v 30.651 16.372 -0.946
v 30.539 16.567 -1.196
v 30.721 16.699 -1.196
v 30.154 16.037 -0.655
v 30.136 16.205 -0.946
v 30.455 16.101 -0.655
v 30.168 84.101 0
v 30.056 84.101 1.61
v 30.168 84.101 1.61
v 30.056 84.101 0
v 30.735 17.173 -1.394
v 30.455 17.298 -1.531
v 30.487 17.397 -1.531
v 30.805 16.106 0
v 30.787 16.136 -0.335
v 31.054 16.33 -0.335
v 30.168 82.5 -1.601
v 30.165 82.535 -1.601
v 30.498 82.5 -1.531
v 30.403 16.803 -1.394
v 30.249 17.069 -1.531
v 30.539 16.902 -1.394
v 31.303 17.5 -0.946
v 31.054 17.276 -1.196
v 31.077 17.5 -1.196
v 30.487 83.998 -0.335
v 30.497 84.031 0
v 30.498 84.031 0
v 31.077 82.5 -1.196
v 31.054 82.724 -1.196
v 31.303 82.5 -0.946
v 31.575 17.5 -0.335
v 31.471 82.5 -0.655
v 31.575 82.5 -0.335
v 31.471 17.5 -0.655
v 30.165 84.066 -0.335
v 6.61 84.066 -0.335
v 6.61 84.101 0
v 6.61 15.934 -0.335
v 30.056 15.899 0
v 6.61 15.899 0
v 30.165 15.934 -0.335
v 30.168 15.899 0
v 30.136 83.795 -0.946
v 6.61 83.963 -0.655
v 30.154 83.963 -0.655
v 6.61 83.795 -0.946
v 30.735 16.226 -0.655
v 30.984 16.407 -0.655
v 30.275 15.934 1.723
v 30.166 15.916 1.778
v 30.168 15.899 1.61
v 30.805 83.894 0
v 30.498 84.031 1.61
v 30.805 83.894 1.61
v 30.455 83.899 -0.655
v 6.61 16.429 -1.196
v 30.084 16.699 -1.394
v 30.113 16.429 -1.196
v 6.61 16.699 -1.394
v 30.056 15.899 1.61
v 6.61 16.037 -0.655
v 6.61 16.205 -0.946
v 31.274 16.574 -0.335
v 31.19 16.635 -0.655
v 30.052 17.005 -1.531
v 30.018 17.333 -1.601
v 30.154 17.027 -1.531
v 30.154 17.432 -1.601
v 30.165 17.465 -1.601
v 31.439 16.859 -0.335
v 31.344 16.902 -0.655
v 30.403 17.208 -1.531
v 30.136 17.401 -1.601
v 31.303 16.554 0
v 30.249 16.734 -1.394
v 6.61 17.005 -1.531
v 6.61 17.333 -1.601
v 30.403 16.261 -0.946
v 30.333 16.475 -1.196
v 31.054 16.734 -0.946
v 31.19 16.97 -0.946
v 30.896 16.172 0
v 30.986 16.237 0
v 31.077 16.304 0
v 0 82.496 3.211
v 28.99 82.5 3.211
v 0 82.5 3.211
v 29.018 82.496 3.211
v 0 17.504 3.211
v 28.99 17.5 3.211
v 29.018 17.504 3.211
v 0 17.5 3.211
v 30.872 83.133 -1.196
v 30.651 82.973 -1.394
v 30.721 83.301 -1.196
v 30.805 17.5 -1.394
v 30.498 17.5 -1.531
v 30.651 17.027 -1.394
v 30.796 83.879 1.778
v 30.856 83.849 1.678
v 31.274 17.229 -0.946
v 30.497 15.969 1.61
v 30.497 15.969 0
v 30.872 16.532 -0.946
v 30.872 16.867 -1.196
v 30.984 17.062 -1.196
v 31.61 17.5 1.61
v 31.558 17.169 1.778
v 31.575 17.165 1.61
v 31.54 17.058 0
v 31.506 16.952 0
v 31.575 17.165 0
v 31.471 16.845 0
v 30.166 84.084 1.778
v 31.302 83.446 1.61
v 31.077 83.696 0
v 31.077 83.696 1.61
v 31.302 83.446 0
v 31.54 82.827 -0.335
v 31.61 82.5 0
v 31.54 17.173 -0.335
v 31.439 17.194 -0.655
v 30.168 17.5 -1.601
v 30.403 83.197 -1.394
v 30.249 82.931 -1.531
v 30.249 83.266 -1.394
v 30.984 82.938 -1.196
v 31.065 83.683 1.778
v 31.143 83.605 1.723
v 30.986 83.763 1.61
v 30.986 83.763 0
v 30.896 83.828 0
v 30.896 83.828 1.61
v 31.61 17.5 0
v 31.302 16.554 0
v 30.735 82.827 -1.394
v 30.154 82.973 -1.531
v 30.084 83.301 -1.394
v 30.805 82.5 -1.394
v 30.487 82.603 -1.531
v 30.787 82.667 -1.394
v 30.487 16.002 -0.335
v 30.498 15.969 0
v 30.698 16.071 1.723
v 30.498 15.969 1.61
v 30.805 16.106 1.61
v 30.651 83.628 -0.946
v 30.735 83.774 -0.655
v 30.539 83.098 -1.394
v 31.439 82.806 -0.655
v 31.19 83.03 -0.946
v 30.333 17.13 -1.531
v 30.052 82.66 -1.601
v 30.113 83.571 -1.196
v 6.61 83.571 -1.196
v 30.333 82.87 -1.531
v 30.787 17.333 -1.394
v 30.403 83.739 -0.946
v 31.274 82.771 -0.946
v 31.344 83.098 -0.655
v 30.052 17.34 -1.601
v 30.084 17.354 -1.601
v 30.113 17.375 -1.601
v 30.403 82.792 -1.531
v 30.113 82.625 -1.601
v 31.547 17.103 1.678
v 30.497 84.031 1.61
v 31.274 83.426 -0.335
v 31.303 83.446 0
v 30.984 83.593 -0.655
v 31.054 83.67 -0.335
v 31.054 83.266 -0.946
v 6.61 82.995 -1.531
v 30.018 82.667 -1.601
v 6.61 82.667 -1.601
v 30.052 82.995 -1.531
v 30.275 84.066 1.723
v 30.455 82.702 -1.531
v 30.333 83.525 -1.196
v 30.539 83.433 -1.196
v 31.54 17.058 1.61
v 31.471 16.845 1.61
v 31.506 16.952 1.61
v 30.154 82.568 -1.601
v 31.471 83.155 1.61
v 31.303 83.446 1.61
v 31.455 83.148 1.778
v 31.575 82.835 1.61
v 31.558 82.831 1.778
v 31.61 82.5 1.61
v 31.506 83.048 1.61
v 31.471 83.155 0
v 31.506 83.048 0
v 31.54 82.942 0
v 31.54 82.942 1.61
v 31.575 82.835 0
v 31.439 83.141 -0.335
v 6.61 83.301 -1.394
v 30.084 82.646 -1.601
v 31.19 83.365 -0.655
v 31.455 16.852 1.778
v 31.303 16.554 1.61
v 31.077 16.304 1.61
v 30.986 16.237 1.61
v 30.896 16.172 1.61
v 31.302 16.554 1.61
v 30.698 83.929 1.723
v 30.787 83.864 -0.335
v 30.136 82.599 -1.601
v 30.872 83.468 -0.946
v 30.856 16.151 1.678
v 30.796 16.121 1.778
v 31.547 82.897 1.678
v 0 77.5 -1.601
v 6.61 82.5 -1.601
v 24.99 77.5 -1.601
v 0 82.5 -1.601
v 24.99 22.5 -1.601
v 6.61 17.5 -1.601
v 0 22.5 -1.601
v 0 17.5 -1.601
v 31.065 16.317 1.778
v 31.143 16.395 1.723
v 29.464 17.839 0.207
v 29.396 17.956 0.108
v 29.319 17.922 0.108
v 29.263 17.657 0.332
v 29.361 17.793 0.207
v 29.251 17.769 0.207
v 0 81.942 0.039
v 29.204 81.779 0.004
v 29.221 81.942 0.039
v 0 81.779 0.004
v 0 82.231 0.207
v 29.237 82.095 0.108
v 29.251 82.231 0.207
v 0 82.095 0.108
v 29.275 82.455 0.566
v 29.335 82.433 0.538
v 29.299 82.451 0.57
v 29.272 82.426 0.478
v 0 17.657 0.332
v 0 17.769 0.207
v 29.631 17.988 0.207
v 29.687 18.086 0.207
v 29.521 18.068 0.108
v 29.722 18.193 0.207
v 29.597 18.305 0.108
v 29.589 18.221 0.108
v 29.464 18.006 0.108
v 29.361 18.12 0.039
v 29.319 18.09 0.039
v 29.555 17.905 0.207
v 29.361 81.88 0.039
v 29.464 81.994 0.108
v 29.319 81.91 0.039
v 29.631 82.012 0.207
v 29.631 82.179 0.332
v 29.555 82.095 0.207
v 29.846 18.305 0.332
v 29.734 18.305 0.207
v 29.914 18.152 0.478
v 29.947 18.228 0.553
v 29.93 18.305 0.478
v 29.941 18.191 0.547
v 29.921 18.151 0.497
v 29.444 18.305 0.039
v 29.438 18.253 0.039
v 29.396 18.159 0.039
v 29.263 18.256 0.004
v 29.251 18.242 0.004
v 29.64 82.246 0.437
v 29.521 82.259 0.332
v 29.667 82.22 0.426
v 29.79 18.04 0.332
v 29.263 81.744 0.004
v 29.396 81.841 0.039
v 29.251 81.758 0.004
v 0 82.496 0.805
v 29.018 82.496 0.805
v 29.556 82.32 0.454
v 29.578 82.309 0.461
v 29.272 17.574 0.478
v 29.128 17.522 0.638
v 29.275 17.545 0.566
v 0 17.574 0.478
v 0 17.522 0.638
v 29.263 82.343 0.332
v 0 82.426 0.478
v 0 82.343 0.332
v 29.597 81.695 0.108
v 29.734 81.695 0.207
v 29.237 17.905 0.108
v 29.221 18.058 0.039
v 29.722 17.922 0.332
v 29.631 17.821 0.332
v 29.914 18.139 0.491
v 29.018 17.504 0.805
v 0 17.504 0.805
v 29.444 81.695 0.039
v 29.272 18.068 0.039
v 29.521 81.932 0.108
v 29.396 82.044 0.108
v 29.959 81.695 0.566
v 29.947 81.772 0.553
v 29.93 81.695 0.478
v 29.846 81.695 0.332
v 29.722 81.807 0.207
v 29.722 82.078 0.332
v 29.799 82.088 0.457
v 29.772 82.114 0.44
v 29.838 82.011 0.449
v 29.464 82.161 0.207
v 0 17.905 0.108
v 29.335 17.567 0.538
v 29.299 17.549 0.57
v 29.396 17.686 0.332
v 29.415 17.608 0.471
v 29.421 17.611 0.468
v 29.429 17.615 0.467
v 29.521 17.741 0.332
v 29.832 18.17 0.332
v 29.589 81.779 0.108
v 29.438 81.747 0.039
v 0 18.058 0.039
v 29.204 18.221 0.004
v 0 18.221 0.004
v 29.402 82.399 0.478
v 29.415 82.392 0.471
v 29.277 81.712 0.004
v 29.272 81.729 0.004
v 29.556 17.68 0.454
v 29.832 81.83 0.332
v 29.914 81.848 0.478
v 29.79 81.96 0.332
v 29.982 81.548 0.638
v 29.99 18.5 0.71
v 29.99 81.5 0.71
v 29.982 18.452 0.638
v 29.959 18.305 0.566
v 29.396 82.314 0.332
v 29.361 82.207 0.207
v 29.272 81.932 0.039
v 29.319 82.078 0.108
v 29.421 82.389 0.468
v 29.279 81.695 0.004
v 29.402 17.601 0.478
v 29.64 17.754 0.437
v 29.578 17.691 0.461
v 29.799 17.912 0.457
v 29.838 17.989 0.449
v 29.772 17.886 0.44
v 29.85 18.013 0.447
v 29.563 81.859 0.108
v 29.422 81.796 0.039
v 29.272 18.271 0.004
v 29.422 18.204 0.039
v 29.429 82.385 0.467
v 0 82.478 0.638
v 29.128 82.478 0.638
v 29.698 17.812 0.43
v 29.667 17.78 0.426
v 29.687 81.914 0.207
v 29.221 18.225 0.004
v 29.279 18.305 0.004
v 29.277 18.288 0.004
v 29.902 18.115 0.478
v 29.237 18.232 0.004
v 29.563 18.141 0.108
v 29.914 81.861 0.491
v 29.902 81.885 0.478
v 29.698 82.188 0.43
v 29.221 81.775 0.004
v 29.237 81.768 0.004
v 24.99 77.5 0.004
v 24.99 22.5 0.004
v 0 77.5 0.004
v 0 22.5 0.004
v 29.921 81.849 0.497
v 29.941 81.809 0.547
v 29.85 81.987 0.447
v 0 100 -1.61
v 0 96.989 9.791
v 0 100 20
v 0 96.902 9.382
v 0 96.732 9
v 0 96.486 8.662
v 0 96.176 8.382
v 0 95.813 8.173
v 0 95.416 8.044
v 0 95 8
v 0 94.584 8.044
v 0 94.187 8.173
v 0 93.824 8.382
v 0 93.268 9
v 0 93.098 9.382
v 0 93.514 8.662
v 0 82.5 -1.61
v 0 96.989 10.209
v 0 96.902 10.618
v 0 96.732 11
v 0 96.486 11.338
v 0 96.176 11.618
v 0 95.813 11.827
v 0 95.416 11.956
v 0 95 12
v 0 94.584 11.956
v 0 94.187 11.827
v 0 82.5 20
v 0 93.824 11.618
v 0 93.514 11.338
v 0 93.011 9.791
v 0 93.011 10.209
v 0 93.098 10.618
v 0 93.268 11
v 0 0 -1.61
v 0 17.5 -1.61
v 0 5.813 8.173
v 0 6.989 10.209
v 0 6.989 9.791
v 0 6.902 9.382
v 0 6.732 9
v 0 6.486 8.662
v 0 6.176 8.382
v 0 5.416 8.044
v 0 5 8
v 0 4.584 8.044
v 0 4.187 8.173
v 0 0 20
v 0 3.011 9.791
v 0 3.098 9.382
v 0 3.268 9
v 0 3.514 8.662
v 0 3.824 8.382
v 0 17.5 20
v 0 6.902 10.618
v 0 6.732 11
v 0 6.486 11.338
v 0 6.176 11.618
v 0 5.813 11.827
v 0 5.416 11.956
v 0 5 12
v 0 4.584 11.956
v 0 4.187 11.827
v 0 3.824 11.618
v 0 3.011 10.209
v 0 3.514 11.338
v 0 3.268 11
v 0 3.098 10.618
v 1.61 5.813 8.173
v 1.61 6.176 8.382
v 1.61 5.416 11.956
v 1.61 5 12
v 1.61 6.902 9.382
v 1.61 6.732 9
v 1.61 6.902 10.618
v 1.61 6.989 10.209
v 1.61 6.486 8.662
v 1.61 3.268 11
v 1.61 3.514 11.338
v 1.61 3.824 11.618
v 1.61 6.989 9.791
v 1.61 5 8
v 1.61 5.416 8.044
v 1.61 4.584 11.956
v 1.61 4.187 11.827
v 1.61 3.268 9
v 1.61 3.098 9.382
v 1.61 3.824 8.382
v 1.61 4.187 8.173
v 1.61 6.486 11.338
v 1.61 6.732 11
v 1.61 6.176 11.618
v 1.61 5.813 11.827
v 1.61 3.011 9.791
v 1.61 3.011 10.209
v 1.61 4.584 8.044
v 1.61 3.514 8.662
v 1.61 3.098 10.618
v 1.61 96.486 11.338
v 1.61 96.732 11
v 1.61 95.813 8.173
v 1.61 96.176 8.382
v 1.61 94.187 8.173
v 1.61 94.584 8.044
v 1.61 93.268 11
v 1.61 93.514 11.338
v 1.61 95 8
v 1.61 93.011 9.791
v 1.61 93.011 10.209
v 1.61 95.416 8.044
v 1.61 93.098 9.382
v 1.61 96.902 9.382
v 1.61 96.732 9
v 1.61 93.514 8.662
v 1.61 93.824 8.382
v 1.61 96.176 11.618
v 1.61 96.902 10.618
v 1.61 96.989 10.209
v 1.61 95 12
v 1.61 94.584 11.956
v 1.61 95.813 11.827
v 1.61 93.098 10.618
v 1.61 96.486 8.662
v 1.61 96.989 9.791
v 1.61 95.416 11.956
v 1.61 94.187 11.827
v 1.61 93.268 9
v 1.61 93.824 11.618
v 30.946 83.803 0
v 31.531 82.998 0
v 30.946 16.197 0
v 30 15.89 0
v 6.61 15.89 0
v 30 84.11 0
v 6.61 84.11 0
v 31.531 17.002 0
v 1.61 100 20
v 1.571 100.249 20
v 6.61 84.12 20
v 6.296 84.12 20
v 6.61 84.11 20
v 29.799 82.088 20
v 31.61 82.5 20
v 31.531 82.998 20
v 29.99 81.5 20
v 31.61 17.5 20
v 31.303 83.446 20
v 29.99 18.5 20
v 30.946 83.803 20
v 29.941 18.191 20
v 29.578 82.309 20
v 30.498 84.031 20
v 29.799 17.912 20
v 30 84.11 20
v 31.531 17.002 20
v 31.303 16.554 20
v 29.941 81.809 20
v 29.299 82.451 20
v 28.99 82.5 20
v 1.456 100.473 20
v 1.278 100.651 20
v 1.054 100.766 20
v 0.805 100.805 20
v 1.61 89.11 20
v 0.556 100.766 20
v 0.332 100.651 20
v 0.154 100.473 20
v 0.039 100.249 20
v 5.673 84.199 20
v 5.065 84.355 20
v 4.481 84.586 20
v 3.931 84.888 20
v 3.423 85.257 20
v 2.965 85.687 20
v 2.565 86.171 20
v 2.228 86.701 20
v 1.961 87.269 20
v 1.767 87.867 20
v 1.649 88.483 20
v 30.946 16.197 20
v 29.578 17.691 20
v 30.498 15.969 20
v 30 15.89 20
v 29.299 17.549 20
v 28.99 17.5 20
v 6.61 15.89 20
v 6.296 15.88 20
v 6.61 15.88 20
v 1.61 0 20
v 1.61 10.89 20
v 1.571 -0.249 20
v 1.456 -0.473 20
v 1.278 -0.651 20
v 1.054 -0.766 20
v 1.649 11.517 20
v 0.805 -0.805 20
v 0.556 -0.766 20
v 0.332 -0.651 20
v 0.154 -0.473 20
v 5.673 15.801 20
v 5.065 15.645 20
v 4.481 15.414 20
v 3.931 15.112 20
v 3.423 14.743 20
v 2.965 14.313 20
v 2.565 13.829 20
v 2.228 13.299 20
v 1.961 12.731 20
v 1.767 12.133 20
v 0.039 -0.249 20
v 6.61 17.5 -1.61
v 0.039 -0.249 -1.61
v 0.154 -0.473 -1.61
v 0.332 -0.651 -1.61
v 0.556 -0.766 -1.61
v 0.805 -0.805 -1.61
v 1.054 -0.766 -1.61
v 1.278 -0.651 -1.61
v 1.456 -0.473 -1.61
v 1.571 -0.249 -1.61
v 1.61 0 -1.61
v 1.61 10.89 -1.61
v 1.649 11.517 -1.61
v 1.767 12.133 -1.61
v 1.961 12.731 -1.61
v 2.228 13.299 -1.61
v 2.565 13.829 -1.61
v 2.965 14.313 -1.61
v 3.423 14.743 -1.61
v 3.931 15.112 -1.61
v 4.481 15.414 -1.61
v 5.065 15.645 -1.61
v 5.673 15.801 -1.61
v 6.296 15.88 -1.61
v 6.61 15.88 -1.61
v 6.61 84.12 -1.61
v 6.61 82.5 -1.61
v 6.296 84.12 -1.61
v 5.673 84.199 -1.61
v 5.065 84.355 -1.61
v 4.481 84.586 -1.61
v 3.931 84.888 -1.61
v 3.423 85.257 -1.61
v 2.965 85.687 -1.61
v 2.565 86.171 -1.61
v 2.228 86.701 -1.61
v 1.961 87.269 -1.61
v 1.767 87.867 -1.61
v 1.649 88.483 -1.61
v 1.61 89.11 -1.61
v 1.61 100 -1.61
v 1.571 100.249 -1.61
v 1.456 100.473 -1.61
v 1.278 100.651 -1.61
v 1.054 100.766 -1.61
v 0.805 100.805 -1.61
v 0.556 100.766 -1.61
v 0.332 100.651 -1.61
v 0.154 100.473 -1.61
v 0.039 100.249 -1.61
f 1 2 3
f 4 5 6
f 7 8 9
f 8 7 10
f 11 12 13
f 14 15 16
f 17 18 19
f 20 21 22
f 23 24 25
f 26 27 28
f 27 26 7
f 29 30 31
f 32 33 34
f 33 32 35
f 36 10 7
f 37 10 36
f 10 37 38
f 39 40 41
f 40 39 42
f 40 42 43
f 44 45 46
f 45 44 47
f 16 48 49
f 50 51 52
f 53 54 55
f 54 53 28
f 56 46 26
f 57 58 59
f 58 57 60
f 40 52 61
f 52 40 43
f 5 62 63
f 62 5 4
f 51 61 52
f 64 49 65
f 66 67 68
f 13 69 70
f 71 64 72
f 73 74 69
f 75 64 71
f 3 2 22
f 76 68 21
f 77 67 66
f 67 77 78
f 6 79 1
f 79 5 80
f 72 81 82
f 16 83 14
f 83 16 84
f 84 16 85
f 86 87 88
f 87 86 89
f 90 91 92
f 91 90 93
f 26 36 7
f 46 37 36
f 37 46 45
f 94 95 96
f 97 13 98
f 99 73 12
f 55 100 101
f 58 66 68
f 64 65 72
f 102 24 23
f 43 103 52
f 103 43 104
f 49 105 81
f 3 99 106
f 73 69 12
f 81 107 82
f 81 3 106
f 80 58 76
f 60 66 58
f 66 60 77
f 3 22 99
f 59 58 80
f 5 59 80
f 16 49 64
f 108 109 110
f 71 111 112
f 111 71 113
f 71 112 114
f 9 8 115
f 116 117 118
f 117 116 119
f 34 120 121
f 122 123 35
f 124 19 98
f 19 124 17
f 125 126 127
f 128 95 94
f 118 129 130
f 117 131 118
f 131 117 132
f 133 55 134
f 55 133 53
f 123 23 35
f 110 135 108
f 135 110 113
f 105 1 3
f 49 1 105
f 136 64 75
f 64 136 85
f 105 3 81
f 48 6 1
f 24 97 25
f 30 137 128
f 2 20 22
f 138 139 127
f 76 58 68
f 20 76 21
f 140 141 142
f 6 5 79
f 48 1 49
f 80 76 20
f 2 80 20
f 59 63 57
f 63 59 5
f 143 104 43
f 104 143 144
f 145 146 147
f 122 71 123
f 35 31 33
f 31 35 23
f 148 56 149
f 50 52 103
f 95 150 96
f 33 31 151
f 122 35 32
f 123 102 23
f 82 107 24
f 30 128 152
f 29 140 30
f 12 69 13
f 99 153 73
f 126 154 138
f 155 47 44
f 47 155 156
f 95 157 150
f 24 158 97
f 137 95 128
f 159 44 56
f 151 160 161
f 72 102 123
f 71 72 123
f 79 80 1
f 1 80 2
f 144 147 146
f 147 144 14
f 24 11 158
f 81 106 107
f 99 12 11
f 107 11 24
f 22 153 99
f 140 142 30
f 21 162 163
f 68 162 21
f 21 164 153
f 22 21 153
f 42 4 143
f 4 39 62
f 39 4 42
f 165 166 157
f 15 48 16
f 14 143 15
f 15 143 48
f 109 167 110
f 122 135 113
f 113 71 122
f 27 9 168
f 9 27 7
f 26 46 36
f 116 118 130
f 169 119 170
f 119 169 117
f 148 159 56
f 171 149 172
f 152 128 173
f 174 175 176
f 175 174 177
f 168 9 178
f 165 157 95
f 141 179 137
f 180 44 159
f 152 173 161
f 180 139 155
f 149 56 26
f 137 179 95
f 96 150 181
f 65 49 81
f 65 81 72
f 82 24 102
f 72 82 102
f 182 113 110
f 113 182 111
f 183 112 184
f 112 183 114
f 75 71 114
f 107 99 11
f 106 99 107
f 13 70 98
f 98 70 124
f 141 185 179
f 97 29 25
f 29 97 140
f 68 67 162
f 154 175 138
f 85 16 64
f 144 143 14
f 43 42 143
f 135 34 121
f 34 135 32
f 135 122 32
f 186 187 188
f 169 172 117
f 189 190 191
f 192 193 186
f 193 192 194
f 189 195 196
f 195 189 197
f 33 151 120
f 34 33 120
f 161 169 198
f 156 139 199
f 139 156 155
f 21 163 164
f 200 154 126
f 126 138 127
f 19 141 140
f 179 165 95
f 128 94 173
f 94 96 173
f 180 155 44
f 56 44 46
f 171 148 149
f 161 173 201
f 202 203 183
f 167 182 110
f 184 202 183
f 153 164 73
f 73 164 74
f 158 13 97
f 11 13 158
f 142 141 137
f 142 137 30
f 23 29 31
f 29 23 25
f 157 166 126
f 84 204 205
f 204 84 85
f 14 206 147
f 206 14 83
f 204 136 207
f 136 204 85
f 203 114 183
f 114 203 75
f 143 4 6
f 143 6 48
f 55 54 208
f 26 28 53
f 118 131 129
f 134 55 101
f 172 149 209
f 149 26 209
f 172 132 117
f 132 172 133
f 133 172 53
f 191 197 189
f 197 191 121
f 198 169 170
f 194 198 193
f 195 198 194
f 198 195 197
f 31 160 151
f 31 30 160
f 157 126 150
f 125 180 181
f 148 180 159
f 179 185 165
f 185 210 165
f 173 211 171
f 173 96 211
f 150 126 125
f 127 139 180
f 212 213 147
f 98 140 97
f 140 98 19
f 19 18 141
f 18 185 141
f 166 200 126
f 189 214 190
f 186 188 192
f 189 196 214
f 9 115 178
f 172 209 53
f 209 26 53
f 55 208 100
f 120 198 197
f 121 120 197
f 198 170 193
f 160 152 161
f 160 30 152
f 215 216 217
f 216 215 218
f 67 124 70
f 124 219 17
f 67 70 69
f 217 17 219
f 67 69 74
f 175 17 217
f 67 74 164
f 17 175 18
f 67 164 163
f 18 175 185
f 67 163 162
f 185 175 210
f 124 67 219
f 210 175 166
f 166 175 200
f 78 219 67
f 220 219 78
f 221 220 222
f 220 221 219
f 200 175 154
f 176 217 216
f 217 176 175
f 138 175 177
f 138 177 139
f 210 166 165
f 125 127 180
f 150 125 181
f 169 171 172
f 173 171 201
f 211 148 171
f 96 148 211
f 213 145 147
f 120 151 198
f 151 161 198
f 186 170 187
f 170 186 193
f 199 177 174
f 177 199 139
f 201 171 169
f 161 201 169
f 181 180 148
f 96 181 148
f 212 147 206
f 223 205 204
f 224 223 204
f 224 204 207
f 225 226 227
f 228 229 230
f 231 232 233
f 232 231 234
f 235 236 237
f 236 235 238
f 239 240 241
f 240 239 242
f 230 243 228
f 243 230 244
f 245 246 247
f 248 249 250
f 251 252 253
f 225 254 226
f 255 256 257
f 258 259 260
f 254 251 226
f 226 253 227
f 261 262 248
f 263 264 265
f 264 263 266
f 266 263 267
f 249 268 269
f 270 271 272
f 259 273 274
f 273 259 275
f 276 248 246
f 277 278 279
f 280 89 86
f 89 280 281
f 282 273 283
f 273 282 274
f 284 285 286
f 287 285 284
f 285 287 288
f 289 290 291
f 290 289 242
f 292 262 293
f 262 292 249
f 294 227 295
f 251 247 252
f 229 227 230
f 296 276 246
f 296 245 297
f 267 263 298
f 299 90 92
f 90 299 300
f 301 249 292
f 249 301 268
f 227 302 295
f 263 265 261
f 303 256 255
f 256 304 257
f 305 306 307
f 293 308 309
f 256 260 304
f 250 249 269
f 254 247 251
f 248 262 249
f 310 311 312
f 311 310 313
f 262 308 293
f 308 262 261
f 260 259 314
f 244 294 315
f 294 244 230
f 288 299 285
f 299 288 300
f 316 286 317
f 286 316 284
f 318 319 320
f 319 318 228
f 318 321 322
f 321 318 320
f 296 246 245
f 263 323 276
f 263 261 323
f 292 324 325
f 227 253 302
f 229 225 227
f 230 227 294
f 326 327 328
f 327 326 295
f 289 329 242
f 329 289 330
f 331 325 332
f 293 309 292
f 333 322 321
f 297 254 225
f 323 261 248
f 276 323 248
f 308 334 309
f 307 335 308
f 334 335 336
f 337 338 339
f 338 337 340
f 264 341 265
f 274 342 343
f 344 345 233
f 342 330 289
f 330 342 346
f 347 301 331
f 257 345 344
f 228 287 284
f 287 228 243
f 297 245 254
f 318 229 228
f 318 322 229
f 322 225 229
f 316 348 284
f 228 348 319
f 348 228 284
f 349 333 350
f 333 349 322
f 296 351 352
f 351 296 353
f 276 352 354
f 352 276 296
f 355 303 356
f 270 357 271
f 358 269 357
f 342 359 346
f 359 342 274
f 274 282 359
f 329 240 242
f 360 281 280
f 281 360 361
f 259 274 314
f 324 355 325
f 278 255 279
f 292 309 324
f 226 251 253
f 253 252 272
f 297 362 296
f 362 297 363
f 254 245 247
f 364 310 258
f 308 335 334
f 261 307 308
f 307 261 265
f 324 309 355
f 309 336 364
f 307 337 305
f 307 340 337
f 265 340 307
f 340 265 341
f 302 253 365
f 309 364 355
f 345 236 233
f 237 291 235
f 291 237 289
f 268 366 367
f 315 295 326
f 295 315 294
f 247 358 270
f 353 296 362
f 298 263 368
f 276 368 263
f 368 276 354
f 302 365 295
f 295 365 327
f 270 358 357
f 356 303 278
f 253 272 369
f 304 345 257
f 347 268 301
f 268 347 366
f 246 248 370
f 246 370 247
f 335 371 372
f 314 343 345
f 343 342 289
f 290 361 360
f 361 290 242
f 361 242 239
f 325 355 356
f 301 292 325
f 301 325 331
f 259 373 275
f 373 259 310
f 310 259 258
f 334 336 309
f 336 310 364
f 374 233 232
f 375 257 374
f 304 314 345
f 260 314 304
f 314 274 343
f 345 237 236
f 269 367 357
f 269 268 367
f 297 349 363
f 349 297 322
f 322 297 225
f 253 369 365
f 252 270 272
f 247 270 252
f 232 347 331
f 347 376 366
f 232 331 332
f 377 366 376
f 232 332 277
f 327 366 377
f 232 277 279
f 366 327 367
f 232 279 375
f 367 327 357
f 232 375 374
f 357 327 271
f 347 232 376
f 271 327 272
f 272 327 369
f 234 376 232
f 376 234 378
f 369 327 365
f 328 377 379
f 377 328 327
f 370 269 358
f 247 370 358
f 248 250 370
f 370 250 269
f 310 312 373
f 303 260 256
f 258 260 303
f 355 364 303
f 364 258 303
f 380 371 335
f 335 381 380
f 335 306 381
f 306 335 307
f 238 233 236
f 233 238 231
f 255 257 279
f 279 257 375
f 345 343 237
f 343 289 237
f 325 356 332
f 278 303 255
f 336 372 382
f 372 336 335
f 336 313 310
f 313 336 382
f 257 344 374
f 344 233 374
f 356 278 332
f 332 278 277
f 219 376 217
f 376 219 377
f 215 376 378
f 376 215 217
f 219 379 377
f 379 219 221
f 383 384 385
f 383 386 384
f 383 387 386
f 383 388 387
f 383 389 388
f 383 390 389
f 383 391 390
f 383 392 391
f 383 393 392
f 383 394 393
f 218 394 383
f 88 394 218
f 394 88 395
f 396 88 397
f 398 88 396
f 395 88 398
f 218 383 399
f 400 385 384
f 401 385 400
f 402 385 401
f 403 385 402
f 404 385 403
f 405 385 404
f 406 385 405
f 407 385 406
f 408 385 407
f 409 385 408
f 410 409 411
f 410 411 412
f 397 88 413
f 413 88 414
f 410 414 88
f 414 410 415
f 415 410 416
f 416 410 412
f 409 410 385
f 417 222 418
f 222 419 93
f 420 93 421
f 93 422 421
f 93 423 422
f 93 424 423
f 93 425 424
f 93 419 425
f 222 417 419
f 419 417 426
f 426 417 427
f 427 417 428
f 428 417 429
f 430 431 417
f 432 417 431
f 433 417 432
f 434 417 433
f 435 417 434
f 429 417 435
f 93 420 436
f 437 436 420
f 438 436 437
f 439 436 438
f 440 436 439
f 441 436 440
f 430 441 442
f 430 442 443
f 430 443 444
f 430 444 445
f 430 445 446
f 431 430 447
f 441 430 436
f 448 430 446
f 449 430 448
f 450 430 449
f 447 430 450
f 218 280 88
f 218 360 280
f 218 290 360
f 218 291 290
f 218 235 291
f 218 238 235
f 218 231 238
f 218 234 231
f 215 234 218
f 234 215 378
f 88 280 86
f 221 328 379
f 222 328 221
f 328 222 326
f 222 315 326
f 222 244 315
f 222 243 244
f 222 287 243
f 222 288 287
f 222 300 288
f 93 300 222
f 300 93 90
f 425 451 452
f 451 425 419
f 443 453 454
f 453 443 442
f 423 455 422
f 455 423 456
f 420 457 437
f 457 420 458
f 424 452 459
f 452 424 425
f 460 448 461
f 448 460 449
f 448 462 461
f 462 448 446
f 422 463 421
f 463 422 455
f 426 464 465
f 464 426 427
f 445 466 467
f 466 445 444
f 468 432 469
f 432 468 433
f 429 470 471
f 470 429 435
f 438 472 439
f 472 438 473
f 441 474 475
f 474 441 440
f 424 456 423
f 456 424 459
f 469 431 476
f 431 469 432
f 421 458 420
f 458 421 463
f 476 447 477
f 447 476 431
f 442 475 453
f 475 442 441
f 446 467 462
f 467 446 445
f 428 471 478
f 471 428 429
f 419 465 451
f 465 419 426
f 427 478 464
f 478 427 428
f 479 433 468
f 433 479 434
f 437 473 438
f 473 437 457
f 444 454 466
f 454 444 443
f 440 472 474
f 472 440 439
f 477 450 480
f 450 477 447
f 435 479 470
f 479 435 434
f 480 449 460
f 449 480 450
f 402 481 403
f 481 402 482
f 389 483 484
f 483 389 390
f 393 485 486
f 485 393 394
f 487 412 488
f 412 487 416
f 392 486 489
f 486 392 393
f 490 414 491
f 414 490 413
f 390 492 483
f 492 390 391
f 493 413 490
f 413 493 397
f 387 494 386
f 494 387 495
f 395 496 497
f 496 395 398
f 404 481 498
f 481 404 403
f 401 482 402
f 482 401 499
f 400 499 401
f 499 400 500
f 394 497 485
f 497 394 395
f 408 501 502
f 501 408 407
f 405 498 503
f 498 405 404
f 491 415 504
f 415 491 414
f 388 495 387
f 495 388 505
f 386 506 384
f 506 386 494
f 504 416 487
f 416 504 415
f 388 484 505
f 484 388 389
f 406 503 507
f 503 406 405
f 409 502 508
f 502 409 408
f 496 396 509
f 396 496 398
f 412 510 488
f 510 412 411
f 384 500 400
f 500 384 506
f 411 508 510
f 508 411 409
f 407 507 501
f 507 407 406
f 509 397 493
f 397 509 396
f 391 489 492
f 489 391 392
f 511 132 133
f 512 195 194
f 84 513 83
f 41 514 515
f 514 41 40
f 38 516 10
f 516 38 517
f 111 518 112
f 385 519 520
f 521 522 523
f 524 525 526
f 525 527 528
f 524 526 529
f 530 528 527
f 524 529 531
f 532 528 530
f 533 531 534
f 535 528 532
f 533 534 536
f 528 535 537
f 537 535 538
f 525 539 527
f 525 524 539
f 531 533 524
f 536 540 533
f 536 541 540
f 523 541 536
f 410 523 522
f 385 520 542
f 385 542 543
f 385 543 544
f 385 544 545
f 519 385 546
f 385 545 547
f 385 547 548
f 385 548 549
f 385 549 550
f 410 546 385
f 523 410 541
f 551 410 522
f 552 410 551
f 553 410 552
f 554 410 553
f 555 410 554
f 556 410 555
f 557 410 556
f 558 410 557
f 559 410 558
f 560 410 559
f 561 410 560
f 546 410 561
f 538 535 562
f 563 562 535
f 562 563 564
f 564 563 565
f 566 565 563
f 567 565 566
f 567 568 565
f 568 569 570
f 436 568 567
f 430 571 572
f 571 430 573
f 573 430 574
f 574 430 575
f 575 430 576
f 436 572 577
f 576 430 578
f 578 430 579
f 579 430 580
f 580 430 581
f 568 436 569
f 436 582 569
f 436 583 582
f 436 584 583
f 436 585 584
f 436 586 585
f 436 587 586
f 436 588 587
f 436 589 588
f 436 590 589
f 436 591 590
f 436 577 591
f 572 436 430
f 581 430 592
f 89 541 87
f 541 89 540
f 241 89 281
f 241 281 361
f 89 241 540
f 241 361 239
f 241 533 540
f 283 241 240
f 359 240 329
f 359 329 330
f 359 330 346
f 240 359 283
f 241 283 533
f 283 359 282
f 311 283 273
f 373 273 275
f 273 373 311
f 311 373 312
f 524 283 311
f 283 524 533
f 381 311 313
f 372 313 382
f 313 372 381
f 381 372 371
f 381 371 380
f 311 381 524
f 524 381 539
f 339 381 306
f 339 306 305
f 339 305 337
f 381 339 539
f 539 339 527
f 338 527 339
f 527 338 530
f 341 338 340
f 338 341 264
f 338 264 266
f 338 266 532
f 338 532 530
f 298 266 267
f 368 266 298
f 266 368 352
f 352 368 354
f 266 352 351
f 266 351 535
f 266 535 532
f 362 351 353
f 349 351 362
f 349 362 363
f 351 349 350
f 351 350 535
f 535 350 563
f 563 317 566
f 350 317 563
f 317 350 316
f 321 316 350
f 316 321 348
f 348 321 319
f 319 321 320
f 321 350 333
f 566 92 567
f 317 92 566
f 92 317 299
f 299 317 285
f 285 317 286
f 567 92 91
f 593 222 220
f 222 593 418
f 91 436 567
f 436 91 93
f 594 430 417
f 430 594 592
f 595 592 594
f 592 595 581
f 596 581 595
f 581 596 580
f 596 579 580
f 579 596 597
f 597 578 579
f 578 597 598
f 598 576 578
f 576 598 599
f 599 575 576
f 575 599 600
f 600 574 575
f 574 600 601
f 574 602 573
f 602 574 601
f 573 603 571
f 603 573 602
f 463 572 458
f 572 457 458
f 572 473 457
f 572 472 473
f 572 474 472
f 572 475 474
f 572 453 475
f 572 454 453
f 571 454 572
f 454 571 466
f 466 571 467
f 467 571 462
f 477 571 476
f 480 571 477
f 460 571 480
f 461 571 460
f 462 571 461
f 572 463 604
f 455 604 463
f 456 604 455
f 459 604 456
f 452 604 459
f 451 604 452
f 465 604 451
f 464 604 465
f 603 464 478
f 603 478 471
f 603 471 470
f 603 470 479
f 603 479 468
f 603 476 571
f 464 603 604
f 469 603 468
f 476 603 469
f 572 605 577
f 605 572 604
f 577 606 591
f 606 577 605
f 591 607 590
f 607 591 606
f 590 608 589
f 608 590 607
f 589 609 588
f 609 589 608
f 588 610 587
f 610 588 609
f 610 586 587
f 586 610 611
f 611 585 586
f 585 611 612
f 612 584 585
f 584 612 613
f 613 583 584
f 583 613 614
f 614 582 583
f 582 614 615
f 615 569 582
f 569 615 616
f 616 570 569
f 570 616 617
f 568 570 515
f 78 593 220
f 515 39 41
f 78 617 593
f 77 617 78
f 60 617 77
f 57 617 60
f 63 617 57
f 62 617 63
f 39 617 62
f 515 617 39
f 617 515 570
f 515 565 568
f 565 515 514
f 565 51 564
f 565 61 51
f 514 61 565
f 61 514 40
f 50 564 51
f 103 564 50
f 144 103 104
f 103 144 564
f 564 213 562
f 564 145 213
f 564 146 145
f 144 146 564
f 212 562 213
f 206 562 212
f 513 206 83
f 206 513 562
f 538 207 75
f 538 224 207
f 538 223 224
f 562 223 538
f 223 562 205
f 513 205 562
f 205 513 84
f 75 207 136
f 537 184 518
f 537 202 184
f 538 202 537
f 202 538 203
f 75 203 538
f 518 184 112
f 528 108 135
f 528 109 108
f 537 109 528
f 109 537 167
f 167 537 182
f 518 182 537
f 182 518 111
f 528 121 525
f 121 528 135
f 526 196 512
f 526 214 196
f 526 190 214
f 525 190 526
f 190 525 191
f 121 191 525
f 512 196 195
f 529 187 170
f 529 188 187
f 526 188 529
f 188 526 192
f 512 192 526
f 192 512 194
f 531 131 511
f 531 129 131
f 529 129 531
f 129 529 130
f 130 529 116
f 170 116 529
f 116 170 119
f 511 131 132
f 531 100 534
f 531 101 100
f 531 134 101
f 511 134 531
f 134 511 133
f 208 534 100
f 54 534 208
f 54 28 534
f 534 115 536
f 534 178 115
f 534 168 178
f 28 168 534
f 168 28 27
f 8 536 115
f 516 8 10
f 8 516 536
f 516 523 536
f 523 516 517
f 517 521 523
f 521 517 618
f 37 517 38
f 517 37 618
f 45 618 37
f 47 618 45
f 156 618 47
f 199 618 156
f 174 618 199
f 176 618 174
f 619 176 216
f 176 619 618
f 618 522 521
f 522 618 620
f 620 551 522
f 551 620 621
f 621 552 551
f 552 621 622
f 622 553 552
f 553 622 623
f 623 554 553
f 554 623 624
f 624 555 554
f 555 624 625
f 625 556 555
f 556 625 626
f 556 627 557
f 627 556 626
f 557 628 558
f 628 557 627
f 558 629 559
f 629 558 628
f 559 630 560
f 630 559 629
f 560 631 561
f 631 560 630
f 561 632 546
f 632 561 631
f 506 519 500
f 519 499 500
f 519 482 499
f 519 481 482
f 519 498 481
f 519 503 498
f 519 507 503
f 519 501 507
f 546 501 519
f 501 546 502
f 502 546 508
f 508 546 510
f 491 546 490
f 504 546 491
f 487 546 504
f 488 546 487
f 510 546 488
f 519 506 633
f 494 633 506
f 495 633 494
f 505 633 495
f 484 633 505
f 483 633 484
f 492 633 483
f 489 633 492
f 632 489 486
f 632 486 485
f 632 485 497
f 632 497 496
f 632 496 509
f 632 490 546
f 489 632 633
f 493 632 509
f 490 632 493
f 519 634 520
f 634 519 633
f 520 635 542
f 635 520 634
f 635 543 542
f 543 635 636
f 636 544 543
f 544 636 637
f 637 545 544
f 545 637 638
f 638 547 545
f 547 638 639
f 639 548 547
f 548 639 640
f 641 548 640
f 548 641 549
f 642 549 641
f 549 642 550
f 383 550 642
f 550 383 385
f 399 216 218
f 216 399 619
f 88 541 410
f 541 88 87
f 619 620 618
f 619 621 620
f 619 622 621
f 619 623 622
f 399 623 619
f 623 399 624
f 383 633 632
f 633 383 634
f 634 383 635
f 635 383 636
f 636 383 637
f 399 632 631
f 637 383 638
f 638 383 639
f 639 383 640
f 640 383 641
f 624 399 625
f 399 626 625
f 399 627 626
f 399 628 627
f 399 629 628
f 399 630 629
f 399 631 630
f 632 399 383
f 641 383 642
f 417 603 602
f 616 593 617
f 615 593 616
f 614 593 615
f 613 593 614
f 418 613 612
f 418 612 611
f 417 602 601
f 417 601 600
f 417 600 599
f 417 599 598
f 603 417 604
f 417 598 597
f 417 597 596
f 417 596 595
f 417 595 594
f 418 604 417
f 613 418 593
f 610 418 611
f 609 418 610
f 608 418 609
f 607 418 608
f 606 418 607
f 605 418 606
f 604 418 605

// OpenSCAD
item_size=[30,65];
thick=1.61;
sidey=100/2-item_size[1]/2;
difference() {
  translate([0,sidey,0]) minkowski() {
    cube([item_size[0],item_size[1],thick]);
    sphere(r=thick,$fn=30);
  }
  translate([0,sidey+thick/2,thick/2]) minkowski() {
    cube([item_size[0]-thick/2,item_size[1]-thick,thick*2]);
    sphere(r=thick/2,$fn=30);
  }
  translate([-.01,sidey+5,-thick*2]) cube([item_size[0]-5,item_size[1]-10,thick*4+1]);
  translate([-thick-1,0,-thick*2]) cube([thick+1,100,thick*4+1]);
}
translate([0,0,-thick]) linear_extrude(thick*2) difference() {
  mirrory(100) difference() {
      union() {
        translate([thick/2,0]) circle(d=thick,$fn=20);
        translate([0,sidey-5-thick]) square([thick+5,5+thick]);
        square([thick,sidey]);
      }
      translate([5+thick,sidey-5-thick]) circle(r=5,$fn=50);
    }
}
difference() {
  linear_extrude(20,convexity=3) {
    difference() {
      translate([0,sidey]) offset(thick,$fn=20) square(item_size);
      translate([-2.01,sidey+1]) offset(,$fn=20) square([item_size[0]+1,item_size[1]-2]);
      translate([-4,0]) square([4,100]);
    }
    mirrory(100) difference() {
      union() {
        translate([thick/2,0]) circle(d=thick,$fn=20);
        translate([0,sidey-5-thick]) square([thick+5,5]);
        square([thick,sidey-5-thick]);
      }
      translate([5+thick,sidey-5-thick]) circle(r=5,$fn=50);
    }
  }
  mirrory(100) translate([-.01,5,10]) rotate([0,90]) cylinder(d=4,h=4,$fn=30);
}
module mirrory(off=0)
{
  translate([0,off/2]) for(m=[0,1]) mirror([0,m]) translate([0,off/-2]) children();
}
